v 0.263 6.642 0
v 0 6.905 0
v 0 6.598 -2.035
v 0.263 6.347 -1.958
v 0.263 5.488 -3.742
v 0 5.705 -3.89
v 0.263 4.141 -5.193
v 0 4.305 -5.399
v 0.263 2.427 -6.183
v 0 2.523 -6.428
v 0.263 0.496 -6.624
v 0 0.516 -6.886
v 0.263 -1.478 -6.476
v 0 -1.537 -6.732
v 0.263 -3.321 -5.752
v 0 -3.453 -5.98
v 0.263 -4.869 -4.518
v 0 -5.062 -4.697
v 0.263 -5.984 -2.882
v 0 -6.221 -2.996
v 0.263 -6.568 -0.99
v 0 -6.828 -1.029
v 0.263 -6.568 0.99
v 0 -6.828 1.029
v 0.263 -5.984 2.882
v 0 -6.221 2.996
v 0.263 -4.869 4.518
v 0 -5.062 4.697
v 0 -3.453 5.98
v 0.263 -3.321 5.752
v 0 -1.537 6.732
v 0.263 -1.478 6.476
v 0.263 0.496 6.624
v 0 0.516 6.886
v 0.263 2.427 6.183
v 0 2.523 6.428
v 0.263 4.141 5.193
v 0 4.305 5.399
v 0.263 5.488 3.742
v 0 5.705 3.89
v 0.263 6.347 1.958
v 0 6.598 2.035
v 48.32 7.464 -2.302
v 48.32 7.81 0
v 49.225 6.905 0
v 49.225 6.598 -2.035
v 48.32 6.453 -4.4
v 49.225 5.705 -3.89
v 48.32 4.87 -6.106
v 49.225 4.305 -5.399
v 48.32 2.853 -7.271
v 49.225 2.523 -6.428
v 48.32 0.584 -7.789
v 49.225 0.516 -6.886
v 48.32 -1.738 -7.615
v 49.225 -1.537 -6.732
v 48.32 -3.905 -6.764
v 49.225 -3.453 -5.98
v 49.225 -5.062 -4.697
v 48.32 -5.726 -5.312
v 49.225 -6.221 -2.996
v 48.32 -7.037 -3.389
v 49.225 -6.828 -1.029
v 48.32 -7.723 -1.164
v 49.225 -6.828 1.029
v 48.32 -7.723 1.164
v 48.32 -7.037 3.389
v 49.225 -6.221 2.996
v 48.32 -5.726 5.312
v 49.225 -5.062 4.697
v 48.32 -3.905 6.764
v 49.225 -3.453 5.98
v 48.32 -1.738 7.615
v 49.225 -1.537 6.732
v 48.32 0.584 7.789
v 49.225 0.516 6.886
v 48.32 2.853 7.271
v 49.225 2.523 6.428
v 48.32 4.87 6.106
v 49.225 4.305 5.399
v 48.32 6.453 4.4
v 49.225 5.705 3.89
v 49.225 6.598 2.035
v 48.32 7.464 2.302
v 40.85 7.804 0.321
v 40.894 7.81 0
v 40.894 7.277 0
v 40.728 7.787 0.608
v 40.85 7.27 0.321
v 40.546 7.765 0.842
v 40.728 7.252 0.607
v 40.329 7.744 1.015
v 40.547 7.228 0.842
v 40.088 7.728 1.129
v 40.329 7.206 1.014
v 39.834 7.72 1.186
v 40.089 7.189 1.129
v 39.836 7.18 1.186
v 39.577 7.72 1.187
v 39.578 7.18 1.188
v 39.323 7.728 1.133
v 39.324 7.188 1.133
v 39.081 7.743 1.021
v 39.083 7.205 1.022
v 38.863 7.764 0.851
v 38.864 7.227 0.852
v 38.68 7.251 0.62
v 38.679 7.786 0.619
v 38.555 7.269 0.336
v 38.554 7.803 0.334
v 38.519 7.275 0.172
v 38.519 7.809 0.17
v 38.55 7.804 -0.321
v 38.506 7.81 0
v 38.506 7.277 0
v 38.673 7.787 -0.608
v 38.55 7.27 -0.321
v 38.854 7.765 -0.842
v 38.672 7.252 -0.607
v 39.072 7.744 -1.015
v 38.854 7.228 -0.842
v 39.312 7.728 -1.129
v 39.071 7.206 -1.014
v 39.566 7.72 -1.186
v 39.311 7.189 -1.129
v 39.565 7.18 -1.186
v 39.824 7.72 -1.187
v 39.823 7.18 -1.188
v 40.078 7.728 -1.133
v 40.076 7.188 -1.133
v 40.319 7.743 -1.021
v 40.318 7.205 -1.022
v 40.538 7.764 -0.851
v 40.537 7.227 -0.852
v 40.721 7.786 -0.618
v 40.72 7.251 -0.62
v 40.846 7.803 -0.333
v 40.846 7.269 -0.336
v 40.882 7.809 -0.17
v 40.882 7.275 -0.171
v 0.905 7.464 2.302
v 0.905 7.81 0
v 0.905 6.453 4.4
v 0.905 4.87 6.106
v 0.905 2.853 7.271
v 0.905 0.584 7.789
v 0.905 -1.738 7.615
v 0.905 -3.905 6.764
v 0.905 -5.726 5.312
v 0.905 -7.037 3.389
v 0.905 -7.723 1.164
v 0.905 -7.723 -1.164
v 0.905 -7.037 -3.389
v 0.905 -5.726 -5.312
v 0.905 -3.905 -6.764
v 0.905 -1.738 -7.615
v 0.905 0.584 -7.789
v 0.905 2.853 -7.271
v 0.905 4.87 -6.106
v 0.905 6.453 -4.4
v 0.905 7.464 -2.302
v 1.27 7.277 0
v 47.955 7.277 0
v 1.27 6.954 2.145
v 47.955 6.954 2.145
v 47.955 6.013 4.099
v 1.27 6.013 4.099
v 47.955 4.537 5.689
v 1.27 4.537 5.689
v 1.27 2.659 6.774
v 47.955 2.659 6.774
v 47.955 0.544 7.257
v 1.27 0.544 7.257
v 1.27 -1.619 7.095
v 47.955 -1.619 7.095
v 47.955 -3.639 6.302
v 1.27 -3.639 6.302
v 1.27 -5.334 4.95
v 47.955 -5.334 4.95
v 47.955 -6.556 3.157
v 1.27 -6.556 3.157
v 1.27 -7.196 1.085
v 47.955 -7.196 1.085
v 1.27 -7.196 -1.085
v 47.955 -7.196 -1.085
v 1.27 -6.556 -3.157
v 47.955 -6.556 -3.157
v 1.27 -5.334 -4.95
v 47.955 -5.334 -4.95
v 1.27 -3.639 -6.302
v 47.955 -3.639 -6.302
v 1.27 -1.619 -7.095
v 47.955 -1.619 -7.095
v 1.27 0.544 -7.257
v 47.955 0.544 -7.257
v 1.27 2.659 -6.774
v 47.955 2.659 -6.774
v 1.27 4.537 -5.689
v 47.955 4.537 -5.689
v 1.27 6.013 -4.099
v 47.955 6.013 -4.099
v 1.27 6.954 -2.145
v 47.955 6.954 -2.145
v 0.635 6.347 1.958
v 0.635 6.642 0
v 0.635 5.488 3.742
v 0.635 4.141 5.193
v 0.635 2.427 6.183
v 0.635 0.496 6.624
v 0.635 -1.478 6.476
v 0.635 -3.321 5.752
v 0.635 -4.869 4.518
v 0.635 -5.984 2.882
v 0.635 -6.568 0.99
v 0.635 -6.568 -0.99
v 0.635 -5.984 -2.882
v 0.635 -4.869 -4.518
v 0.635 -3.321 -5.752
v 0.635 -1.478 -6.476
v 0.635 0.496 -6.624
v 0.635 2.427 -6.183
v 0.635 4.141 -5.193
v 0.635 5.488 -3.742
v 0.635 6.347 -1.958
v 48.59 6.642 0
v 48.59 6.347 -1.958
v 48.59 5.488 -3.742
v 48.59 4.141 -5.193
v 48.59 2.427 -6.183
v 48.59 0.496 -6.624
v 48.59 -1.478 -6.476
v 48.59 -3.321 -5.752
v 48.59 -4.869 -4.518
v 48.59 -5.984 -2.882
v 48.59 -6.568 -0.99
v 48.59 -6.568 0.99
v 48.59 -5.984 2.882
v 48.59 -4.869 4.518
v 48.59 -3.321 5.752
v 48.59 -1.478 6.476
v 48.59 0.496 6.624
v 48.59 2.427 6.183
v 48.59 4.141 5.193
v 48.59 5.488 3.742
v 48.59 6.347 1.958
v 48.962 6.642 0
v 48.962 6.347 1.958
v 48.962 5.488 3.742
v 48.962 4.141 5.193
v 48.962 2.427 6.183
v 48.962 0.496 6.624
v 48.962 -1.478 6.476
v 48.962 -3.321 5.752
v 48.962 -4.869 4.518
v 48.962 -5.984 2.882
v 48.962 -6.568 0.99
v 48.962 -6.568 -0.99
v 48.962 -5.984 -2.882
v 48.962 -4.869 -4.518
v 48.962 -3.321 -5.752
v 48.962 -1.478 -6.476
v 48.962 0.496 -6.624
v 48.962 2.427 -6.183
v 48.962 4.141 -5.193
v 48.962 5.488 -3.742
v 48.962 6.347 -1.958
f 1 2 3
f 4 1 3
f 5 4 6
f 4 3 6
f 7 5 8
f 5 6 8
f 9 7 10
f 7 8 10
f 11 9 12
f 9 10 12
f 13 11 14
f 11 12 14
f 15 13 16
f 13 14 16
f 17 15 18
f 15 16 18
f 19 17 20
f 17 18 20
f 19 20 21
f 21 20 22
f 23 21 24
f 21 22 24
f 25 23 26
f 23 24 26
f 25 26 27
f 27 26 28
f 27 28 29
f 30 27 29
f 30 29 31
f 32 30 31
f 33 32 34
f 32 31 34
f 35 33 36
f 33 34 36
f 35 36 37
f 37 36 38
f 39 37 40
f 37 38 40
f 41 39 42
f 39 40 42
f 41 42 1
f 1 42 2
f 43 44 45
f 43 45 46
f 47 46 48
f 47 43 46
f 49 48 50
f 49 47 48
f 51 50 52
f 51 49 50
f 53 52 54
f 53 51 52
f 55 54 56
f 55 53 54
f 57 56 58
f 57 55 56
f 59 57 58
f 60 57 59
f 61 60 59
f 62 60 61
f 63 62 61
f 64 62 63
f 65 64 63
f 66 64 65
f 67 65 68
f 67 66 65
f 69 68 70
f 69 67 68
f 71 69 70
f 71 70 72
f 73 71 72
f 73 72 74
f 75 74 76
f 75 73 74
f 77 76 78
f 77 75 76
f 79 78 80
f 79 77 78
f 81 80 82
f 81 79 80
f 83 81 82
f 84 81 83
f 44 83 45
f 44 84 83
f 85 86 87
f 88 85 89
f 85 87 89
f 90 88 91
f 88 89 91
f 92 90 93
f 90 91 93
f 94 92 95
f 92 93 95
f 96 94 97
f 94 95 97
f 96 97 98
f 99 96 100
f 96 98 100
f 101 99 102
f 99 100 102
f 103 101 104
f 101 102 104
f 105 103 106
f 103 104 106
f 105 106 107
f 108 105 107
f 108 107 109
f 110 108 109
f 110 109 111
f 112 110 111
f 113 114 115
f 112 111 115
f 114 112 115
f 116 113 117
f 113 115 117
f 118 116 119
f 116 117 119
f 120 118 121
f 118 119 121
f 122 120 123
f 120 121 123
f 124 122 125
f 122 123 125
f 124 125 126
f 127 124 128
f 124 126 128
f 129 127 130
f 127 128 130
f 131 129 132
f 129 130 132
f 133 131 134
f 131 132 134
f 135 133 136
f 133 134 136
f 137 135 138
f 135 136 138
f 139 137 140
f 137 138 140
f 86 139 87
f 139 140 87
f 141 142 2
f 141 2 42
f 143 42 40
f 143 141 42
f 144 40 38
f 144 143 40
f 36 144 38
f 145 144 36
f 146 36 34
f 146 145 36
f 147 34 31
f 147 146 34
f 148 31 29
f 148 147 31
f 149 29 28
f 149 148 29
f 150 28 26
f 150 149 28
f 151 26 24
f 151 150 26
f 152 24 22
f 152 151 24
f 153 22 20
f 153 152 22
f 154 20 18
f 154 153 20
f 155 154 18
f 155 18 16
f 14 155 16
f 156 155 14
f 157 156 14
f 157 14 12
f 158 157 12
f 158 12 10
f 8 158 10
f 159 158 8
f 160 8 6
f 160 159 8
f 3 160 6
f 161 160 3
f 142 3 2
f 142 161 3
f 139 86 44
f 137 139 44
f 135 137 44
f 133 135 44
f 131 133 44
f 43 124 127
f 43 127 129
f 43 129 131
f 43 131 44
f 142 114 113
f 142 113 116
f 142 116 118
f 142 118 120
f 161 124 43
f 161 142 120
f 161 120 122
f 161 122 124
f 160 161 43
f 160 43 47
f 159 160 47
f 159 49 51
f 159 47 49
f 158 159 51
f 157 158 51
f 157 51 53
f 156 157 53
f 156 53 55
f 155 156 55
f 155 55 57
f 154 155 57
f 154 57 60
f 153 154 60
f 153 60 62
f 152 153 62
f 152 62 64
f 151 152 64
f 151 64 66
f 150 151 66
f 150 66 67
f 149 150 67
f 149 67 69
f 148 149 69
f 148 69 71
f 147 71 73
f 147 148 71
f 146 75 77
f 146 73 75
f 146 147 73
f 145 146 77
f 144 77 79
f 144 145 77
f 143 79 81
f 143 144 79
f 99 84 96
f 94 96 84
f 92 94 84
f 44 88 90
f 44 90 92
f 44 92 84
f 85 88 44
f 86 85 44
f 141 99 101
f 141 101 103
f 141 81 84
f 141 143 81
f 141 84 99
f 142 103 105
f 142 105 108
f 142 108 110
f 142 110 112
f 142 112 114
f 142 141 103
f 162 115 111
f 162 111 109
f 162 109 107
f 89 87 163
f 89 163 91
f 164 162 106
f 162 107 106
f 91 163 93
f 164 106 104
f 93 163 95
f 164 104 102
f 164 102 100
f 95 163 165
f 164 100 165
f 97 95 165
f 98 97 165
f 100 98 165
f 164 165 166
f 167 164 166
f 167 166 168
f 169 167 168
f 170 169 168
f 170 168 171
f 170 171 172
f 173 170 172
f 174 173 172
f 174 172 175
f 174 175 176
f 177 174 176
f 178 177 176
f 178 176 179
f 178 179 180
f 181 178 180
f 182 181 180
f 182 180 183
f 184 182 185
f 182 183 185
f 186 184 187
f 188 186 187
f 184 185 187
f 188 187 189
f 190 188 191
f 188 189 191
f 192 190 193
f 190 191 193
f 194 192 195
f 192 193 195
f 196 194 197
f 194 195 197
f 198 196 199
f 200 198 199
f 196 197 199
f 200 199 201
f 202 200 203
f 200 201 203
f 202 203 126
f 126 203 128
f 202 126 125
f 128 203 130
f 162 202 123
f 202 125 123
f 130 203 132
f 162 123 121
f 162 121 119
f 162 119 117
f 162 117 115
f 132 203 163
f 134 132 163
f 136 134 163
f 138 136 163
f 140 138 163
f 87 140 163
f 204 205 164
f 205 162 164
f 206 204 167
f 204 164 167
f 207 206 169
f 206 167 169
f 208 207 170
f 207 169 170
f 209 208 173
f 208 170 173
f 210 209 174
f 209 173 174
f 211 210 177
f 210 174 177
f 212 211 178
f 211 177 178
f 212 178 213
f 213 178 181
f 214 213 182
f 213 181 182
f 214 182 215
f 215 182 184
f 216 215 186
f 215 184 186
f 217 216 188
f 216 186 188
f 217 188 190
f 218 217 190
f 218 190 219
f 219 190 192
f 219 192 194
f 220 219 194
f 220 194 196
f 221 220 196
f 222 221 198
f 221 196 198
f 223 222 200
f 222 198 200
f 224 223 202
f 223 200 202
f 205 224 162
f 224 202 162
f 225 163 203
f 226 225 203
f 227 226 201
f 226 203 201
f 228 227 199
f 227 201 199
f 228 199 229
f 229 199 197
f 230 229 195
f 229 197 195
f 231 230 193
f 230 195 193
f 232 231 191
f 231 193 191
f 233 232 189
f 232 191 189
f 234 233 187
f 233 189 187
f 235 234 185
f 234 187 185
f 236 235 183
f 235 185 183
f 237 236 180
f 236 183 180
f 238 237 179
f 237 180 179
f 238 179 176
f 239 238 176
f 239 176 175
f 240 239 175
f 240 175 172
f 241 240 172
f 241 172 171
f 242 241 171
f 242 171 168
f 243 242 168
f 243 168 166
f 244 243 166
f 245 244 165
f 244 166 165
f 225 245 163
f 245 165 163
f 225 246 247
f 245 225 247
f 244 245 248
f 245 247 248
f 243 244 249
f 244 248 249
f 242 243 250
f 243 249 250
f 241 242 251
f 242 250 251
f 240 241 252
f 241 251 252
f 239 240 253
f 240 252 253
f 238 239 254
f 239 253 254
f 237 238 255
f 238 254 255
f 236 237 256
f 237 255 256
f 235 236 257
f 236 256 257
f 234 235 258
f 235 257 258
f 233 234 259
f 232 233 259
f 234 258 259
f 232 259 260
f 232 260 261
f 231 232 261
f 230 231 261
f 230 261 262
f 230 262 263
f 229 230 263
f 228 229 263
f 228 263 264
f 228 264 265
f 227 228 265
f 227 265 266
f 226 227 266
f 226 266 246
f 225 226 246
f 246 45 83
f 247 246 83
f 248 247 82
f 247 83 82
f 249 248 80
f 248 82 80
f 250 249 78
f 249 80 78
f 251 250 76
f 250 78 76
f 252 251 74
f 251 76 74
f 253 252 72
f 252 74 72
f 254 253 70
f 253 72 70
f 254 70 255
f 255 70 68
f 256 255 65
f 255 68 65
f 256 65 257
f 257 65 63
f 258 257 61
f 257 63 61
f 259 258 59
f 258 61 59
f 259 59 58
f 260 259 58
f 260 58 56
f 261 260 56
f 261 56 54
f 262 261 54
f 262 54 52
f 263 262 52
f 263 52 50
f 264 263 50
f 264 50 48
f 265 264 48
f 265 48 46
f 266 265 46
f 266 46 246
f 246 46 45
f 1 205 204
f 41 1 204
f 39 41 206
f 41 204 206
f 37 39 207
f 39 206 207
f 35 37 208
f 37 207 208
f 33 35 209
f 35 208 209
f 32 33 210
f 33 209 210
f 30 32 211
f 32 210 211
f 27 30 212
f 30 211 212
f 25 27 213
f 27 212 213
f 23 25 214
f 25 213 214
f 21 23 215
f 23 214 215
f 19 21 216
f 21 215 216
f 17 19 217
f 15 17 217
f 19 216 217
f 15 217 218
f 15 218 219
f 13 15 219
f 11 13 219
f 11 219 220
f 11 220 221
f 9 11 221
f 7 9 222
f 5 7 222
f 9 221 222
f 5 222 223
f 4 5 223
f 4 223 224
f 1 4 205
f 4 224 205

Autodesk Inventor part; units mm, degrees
sketch "Sketch_5" plane through (0, 0, 0) normal (0, 0, 1) x (1, 0, 0)
  line L0 (49.2252, 0) -> (-49.2252, 0)
  line L1 (0, 6.9051) -> (0.263, 6.6421)
  line L2 (0.263, 6.6421) -> (0.635, 6.6421)
  line L3 (0.635, 6.6421) -> (1.27, 7.2771)
  line L4 (1.27, 7.2771) -> (47.9552, 7.2771)
  line L5 (47.9552, 7.2771) -> (48.5902, 6.6421)
  line L6 (48.5902, 6.6421) -> (48.9622, 6.6421)
  line L7 (48.9622, 6.6421) -> (49.2252, 6.9051)
  line L8 (49.2252, 6.9051) -> (48.3198, 7.8105)
  line L9 (48.3198, 7.8105) -> (0.9054, 7.8105)
  line L10 (0.9054, 7.8105) -> (0, 6.9051)
revolve "Revolution1" add sketch "Sketch_5" angle 360 about axis through (49.2252, 0, 0) along (1, 0, 0)
sketch "Sketch_1" plane through (0, 0, 0) normal (0, 0, 1) x (1, 0, 0)
  line L0 (39.7002, 0) -> (39.7002, 7.8105)
  line L1 (39.7002, 7.8105) -> (40.894, 7.8105)
  line L2 (40.894, 7.8105) -> (40.894, 0)
  line L3 (40.894, 0) -> (39.7002, 0)
  line L4 (39.7002, 0) -> (39.7002, 7.8105)
revolve "Revolution2" cut sketch "Sketch_1" angle 360 about axis through (39.7002, 0, 0) along (0, -1, 0)
ref_plane "o1_XY" through (0, -7.8105, 0) normal (1, 0, 0) x (0, 0, -1)
ref_plane "o1_YZ" through (0, -7.8105, 0) normal (0, 0, -1) x (0, 1, 0)
ref_plane "o1_ZX" through (0, -7.8105, 0) normal (0, 1, 0) x (1, 0, 0)
ref_plane "o2_XY" through (0, 7.8105, 0) normal (1, 0, 0) x (0, 0, -1)
ref_plane "o2_YZ" through (0, 7.8105, 0) normal (0, 0, -1) x (0, 1, 0)
ref_plane "o2_ZX" through (0, 7.8105, 0) normal (0, 1, 0) x (1, 0, 0)
ref_plane "t1_XY" through (24.6126, 7.8105, 0) normal (1, 0, 0) x (0, 0, -1)
ref_plane "t1_YZ" through (24.6126, 7.8105, 0) normal (0, 0, -1) x (0, 1, 0)
ref_plane "t1_ZX" through (24.6126, 7.8105, 0) normal (0, 1, 0) x (1, 0, 0)
ref_plane "t2_XY" through (24.6126, 0, -7.8105) normal (1, 0, 0) x (0, 0, -1)
ref_plane "t2_YZ" through (24.6126, 0, -7.8105) normal (0, 0, -1) x (0, 1, 0)
ref_plane "t2_ZX" through (24.6126, 0, -7.8105) normal (0, 1, 0) x (1, 0, 0)
ref_plane "t3_XY" through (24.6126, -7.8105, 0) normal (1, 0, 0) x (0, 0, -1)
ref_plane "t3_YZ" through (24.6126, -7.8105, 0) normal (0, 0, -1) x (0, 1, 0)
ref_plane "t3_ZX" through (24.6126, -7.8105, 0) normal (0, 1, 0) x (1, 0, 0)
ref_plane "t4_XY" through (24.6126, 0, 7.8105) normal (1, 0, 0) x (0, 0, -1)
ref_plane "t4_YZ" through (24.6126, 0, 7.8105) normal (0, 0, -1) x (0, 1, 0)
ref_plane "t4_ZX" through (24.6126, 0, 7.8105) normal (0, 1, 0) x (1, 0, 0)
ref_plane "tube1_XY" through (1.27, 0, 0) normal (1, 0, 0) x (0, 0, -1)
ref_plane "tube1_YZ" through (1.27, 0, 0) normal (0, 0, -1) x (0, 1, 0)
ref_plane "tube1_ZX" through (1.27, 0, 0) normal (0, 1, 0) x (1, 0, 0)
ref_plane "tube2_XY" through (47.9552, 0, 0) normal (1, 0, 0) x (0, 0, -1)
ref_plane "tube2_YZ" through (47.9552, 0, 0) normal (0, 0, -1) x (0, 1, 0)
ref_plane "tube2_ZX" through (47.9552, 0, 0) normal (0, 1, 0) x (1, 0, 0)
properties part number "D-75938XP-1.938"
